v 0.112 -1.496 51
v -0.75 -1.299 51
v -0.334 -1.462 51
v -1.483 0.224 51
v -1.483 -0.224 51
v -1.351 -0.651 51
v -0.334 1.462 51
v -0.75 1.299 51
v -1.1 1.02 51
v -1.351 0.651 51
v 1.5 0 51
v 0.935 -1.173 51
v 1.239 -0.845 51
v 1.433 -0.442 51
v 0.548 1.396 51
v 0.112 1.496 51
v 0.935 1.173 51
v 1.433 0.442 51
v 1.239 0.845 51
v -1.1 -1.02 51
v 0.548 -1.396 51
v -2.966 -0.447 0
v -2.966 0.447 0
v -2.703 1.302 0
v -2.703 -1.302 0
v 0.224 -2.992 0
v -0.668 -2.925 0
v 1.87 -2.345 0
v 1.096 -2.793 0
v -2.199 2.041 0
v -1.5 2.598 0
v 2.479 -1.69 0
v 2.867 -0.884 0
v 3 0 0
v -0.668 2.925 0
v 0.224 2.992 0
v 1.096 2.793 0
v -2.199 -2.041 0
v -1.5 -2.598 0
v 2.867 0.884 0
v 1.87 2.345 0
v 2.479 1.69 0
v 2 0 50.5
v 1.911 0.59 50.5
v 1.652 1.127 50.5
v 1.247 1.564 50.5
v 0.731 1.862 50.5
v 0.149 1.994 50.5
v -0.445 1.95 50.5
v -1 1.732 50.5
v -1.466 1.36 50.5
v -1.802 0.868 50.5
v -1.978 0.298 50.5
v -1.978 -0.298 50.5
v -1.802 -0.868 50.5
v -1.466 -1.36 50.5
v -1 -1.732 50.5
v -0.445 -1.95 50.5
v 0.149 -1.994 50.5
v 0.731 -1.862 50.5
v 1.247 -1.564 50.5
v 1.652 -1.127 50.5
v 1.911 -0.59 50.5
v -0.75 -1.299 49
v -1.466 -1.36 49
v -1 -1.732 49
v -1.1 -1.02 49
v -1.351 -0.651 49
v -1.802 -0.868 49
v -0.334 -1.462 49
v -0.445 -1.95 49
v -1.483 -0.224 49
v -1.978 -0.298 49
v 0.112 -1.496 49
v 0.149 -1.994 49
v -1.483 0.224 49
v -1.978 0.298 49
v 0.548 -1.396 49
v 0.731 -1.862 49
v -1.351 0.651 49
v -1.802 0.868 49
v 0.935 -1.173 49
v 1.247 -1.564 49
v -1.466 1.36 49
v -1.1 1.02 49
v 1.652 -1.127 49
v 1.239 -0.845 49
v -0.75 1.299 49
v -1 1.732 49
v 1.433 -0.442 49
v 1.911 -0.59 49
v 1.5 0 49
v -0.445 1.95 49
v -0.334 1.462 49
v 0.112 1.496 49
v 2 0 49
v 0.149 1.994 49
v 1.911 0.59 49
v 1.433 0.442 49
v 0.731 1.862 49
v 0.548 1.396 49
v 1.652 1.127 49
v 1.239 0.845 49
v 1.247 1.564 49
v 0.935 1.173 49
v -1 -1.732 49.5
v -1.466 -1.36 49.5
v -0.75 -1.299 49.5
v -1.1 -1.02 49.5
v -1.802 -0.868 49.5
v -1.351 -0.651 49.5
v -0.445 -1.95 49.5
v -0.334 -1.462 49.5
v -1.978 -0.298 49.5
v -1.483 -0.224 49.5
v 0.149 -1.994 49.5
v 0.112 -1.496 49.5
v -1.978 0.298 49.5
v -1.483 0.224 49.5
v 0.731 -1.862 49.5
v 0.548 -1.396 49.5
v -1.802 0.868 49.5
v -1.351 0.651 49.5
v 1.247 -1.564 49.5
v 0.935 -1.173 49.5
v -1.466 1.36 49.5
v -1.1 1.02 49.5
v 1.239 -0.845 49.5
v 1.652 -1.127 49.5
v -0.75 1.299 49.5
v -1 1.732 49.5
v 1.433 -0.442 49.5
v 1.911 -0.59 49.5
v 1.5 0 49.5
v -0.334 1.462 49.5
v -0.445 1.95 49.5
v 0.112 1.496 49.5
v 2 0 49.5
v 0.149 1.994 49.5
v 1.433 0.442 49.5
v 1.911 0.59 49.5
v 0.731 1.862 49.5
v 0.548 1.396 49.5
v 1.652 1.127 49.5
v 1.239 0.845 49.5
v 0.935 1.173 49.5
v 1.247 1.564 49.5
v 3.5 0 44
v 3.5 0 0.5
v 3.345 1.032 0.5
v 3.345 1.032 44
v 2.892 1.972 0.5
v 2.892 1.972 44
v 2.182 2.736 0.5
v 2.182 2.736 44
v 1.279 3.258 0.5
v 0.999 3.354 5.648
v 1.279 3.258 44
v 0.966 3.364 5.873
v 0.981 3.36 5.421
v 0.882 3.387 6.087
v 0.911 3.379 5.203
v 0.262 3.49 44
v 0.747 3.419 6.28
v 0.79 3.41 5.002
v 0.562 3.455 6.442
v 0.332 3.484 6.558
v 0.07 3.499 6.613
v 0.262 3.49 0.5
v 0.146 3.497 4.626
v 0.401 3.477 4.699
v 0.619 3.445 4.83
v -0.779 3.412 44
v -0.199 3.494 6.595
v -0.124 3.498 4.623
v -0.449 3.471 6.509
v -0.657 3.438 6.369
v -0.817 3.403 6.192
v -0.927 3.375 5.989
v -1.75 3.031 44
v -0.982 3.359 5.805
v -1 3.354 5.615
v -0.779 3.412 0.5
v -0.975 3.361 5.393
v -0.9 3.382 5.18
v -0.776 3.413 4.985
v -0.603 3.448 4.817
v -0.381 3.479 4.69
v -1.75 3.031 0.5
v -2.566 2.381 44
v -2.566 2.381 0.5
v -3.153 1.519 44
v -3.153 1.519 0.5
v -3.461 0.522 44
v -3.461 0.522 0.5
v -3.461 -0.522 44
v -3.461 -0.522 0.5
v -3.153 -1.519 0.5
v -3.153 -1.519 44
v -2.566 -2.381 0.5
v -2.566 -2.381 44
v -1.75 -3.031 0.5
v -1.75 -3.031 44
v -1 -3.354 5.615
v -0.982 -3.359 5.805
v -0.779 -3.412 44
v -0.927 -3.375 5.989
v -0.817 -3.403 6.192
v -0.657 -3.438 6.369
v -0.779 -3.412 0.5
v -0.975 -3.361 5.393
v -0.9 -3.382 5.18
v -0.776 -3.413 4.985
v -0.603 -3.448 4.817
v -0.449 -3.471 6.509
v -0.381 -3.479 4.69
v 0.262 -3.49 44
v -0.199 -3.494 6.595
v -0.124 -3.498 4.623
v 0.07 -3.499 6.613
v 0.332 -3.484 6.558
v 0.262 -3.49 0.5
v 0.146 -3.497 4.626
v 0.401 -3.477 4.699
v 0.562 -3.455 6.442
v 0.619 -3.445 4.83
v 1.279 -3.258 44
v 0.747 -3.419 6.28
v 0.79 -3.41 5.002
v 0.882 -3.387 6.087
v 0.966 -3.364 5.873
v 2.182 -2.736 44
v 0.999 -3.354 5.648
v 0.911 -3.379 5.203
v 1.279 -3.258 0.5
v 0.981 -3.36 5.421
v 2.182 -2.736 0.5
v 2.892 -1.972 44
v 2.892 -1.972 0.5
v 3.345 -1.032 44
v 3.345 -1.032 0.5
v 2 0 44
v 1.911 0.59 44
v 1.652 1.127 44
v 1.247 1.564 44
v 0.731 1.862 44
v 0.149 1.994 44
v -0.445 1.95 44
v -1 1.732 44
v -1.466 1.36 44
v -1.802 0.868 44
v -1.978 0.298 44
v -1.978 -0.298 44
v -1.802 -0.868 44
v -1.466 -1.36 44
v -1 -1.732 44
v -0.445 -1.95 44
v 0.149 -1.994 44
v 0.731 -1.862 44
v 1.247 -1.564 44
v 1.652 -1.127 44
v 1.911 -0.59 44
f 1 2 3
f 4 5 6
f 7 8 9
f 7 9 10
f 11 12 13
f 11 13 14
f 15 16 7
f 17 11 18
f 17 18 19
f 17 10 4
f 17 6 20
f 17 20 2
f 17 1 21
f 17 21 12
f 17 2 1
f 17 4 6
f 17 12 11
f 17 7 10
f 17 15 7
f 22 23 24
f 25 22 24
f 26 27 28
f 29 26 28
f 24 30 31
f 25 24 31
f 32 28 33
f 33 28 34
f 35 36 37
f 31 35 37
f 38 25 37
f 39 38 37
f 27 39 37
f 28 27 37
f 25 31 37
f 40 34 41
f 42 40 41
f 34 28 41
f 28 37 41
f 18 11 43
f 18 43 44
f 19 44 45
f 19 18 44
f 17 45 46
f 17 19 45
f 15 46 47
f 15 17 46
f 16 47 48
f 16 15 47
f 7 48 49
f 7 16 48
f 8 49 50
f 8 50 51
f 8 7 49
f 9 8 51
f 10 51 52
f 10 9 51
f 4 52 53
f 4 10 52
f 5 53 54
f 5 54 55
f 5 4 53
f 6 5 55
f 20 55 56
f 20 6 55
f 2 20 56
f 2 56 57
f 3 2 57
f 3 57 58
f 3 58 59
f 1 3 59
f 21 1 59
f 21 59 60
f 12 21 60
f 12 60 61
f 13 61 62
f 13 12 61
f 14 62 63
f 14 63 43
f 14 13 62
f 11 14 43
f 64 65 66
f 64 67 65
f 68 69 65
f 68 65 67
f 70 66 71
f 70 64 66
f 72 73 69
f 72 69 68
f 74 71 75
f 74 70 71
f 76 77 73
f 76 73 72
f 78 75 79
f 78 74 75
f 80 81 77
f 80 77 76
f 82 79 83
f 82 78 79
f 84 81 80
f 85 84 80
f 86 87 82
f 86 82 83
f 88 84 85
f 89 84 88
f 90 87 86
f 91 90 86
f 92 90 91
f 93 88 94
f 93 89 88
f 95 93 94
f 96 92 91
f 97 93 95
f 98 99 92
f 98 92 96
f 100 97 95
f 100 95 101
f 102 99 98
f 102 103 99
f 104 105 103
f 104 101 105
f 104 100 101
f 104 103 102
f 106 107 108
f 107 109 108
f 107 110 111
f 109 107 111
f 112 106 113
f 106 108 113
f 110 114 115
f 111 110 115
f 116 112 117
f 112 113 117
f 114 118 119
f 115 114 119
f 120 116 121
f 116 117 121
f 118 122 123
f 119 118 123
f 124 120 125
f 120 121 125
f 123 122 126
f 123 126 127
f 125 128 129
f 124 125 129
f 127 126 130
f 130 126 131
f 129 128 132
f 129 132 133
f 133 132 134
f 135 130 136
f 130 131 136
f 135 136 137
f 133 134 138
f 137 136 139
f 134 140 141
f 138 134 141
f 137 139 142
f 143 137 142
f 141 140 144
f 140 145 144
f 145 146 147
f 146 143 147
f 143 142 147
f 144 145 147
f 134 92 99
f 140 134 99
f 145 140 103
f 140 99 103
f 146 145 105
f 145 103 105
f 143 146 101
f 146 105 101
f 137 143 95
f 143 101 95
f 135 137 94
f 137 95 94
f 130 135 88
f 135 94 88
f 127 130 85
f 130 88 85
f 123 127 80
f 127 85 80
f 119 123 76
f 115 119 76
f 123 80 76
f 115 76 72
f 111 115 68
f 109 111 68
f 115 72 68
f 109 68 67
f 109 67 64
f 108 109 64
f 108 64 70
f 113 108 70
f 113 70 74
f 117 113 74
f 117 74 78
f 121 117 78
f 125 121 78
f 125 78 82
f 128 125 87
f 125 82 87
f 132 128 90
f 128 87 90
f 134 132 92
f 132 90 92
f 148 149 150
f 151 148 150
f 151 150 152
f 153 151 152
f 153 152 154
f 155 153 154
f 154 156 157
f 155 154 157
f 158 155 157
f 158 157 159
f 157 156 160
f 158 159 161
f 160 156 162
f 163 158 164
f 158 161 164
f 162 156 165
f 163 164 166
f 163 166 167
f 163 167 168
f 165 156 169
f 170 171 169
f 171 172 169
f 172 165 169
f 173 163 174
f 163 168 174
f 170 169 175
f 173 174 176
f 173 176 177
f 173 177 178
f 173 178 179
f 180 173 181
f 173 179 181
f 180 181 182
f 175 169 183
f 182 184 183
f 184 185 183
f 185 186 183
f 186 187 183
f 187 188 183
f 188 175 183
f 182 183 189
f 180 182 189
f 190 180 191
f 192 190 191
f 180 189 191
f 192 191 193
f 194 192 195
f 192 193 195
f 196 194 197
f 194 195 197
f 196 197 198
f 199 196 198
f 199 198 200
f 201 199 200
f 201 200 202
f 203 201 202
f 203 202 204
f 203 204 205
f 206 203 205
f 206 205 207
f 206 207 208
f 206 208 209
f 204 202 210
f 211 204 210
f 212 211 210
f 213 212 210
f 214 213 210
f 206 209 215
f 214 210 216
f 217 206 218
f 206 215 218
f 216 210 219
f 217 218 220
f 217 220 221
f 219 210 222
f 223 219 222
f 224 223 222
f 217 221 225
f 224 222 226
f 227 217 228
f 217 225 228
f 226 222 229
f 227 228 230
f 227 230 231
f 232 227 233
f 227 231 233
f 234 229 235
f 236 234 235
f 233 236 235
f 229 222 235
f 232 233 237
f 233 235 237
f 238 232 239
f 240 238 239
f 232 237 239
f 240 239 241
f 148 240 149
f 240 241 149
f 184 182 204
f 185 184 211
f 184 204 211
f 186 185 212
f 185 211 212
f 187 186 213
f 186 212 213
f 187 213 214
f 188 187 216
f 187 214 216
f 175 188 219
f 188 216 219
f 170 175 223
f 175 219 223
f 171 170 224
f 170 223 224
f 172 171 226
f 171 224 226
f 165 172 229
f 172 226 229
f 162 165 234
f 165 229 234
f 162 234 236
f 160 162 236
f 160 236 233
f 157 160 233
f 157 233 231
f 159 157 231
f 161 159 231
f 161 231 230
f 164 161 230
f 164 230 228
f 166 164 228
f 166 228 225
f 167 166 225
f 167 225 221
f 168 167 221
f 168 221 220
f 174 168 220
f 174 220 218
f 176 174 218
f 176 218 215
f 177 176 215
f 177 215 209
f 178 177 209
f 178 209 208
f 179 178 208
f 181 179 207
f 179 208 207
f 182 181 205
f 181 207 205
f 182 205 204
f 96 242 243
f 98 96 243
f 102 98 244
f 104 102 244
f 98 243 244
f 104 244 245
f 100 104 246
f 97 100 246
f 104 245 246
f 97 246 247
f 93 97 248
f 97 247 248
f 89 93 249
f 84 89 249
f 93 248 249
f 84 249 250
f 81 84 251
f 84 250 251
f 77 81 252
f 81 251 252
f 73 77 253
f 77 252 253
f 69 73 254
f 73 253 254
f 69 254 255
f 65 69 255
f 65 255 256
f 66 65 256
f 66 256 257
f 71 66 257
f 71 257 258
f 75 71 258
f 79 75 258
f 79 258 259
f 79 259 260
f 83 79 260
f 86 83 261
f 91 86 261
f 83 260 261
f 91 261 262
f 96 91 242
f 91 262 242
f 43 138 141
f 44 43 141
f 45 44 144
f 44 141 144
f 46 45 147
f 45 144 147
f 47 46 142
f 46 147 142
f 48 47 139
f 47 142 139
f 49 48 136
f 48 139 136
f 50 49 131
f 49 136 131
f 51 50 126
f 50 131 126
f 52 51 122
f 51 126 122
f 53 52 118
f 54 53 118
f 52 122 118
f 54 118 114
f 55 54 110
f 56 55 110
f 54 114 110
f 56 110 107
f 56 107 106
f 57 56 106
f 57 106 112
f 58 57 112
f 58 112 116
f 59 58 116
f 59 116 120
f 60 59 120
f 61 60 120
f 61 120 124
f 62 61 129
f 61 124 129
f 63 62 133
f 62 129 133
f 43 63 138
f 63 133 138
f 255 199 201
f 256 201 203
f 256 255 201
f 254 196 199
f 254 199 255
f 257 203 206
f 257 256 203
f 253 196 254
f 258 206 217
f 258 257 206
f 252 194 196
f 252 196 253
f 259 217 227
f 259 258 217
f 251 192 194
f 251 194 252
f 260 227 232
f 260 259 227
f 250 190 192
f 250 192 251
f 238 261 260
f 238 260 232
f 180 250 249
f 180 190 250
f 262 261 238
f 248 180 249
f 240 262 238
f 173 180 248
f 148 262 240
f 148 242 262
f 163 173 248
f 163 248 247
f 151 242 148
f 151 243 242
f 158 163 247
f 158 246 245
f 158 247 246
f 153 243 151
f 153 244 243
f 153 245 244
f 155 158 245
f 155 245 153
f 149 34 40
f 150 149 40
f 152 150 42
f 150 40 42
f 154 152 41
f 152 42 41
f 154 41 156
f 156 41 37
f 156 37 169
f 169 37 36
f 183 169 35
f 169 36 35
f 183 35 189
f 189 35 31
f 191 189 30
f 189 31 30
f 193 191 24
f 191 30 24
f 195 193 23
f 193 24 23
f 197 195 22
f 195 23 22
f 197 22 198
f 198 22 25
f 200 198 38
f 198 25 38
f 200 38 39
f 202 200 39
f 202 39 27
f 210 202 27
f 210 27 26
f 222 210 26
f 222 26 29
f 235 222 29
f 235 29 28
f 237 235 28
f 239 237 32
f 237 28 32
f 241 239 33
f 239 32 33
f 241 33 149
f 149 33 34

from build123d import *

# Parameters (mm, degrees)
ESQUISSE1_R                   = 3.5
BOSS_EXTRU_1_DEPTH            = 44
ESQUISSE2_R                   = 2
BOSS_EXTRU_2_DEPTH            = 5
ESQUISSE3_R                   = 1.5
BOSS_EXTRU_3_DEPTH            = 0.5
ESQUISSE4_R                   = 2
BOSS_EXTRU_4_DEPTH            = 1.5
CHANFREIN1_SIZE               = 0.5
CHANFREIN2_SIZE               = 0.5
DIAM_TRE_DU_PER_AGE_2_0_2_3_D = 2


with BuildPart() as part:
    # Esquisse1 → Boss.-Extru.1 (new body)
    with BuildSketch(Plane.XY):
        Circle(ESQUISSE1_R)
    extrude(amount=BOSS_EXTRU_1_DEPTH)

    # Esquisse2 → Boss.-Extru.2 (add)
    with BuildSketch(Plane.XY.offset(44)):
        Circle(ESQUISSE2_R)
    extrude(amount=BOSS_EXTRU_2_DEPTH)

    # Esquisse3 → Boss.-Extru.3 (add)
    with BuildSketch(Plane.XY.offset(49)):
        Circle(ESQUISSE3_R)
    extrude(amount=BOSS_EXTRU_3_DEPTH)

    # Esquisse4 → Boss.-Extru.4 (add)
    with BuildSketch(Plane.XY.offset(49.5)):
        Circle(ESQUISSE4_R)
    extrude(amount=BOSS_EXTRU_4_DEPTH)

    # Chanfrein1
    chanfrein1_edges = [part.edges().sort_by_distance(p)[0] for p in [
        (-2, 0, 51),
    ]]
    chamfer(chanfrein1_edges, length=CHANFREIN1_SIZE)

    # Chanfrein2
    chanfrein2_edges = [part.edges().sort_by_distance(p)[0] for p in [
        (-3.5, 0, 0),
    ]]
    chamfer(chanfrein2_edges, length=CHANFREIN2_SIZE)

    # Diamètre du perçage Ø2.0 (2)3 (through all)
    with Locations(Plane(origin=(0, 3.5, 5.615), x_dir=(1, 0, 0), z_dir=(0, 1, 0))):
        with Locations((0, 0)):
            Hole(DIAM_TRE_DU_PER_AGE_2_0_2_3_D / 2)


solid = part.part
